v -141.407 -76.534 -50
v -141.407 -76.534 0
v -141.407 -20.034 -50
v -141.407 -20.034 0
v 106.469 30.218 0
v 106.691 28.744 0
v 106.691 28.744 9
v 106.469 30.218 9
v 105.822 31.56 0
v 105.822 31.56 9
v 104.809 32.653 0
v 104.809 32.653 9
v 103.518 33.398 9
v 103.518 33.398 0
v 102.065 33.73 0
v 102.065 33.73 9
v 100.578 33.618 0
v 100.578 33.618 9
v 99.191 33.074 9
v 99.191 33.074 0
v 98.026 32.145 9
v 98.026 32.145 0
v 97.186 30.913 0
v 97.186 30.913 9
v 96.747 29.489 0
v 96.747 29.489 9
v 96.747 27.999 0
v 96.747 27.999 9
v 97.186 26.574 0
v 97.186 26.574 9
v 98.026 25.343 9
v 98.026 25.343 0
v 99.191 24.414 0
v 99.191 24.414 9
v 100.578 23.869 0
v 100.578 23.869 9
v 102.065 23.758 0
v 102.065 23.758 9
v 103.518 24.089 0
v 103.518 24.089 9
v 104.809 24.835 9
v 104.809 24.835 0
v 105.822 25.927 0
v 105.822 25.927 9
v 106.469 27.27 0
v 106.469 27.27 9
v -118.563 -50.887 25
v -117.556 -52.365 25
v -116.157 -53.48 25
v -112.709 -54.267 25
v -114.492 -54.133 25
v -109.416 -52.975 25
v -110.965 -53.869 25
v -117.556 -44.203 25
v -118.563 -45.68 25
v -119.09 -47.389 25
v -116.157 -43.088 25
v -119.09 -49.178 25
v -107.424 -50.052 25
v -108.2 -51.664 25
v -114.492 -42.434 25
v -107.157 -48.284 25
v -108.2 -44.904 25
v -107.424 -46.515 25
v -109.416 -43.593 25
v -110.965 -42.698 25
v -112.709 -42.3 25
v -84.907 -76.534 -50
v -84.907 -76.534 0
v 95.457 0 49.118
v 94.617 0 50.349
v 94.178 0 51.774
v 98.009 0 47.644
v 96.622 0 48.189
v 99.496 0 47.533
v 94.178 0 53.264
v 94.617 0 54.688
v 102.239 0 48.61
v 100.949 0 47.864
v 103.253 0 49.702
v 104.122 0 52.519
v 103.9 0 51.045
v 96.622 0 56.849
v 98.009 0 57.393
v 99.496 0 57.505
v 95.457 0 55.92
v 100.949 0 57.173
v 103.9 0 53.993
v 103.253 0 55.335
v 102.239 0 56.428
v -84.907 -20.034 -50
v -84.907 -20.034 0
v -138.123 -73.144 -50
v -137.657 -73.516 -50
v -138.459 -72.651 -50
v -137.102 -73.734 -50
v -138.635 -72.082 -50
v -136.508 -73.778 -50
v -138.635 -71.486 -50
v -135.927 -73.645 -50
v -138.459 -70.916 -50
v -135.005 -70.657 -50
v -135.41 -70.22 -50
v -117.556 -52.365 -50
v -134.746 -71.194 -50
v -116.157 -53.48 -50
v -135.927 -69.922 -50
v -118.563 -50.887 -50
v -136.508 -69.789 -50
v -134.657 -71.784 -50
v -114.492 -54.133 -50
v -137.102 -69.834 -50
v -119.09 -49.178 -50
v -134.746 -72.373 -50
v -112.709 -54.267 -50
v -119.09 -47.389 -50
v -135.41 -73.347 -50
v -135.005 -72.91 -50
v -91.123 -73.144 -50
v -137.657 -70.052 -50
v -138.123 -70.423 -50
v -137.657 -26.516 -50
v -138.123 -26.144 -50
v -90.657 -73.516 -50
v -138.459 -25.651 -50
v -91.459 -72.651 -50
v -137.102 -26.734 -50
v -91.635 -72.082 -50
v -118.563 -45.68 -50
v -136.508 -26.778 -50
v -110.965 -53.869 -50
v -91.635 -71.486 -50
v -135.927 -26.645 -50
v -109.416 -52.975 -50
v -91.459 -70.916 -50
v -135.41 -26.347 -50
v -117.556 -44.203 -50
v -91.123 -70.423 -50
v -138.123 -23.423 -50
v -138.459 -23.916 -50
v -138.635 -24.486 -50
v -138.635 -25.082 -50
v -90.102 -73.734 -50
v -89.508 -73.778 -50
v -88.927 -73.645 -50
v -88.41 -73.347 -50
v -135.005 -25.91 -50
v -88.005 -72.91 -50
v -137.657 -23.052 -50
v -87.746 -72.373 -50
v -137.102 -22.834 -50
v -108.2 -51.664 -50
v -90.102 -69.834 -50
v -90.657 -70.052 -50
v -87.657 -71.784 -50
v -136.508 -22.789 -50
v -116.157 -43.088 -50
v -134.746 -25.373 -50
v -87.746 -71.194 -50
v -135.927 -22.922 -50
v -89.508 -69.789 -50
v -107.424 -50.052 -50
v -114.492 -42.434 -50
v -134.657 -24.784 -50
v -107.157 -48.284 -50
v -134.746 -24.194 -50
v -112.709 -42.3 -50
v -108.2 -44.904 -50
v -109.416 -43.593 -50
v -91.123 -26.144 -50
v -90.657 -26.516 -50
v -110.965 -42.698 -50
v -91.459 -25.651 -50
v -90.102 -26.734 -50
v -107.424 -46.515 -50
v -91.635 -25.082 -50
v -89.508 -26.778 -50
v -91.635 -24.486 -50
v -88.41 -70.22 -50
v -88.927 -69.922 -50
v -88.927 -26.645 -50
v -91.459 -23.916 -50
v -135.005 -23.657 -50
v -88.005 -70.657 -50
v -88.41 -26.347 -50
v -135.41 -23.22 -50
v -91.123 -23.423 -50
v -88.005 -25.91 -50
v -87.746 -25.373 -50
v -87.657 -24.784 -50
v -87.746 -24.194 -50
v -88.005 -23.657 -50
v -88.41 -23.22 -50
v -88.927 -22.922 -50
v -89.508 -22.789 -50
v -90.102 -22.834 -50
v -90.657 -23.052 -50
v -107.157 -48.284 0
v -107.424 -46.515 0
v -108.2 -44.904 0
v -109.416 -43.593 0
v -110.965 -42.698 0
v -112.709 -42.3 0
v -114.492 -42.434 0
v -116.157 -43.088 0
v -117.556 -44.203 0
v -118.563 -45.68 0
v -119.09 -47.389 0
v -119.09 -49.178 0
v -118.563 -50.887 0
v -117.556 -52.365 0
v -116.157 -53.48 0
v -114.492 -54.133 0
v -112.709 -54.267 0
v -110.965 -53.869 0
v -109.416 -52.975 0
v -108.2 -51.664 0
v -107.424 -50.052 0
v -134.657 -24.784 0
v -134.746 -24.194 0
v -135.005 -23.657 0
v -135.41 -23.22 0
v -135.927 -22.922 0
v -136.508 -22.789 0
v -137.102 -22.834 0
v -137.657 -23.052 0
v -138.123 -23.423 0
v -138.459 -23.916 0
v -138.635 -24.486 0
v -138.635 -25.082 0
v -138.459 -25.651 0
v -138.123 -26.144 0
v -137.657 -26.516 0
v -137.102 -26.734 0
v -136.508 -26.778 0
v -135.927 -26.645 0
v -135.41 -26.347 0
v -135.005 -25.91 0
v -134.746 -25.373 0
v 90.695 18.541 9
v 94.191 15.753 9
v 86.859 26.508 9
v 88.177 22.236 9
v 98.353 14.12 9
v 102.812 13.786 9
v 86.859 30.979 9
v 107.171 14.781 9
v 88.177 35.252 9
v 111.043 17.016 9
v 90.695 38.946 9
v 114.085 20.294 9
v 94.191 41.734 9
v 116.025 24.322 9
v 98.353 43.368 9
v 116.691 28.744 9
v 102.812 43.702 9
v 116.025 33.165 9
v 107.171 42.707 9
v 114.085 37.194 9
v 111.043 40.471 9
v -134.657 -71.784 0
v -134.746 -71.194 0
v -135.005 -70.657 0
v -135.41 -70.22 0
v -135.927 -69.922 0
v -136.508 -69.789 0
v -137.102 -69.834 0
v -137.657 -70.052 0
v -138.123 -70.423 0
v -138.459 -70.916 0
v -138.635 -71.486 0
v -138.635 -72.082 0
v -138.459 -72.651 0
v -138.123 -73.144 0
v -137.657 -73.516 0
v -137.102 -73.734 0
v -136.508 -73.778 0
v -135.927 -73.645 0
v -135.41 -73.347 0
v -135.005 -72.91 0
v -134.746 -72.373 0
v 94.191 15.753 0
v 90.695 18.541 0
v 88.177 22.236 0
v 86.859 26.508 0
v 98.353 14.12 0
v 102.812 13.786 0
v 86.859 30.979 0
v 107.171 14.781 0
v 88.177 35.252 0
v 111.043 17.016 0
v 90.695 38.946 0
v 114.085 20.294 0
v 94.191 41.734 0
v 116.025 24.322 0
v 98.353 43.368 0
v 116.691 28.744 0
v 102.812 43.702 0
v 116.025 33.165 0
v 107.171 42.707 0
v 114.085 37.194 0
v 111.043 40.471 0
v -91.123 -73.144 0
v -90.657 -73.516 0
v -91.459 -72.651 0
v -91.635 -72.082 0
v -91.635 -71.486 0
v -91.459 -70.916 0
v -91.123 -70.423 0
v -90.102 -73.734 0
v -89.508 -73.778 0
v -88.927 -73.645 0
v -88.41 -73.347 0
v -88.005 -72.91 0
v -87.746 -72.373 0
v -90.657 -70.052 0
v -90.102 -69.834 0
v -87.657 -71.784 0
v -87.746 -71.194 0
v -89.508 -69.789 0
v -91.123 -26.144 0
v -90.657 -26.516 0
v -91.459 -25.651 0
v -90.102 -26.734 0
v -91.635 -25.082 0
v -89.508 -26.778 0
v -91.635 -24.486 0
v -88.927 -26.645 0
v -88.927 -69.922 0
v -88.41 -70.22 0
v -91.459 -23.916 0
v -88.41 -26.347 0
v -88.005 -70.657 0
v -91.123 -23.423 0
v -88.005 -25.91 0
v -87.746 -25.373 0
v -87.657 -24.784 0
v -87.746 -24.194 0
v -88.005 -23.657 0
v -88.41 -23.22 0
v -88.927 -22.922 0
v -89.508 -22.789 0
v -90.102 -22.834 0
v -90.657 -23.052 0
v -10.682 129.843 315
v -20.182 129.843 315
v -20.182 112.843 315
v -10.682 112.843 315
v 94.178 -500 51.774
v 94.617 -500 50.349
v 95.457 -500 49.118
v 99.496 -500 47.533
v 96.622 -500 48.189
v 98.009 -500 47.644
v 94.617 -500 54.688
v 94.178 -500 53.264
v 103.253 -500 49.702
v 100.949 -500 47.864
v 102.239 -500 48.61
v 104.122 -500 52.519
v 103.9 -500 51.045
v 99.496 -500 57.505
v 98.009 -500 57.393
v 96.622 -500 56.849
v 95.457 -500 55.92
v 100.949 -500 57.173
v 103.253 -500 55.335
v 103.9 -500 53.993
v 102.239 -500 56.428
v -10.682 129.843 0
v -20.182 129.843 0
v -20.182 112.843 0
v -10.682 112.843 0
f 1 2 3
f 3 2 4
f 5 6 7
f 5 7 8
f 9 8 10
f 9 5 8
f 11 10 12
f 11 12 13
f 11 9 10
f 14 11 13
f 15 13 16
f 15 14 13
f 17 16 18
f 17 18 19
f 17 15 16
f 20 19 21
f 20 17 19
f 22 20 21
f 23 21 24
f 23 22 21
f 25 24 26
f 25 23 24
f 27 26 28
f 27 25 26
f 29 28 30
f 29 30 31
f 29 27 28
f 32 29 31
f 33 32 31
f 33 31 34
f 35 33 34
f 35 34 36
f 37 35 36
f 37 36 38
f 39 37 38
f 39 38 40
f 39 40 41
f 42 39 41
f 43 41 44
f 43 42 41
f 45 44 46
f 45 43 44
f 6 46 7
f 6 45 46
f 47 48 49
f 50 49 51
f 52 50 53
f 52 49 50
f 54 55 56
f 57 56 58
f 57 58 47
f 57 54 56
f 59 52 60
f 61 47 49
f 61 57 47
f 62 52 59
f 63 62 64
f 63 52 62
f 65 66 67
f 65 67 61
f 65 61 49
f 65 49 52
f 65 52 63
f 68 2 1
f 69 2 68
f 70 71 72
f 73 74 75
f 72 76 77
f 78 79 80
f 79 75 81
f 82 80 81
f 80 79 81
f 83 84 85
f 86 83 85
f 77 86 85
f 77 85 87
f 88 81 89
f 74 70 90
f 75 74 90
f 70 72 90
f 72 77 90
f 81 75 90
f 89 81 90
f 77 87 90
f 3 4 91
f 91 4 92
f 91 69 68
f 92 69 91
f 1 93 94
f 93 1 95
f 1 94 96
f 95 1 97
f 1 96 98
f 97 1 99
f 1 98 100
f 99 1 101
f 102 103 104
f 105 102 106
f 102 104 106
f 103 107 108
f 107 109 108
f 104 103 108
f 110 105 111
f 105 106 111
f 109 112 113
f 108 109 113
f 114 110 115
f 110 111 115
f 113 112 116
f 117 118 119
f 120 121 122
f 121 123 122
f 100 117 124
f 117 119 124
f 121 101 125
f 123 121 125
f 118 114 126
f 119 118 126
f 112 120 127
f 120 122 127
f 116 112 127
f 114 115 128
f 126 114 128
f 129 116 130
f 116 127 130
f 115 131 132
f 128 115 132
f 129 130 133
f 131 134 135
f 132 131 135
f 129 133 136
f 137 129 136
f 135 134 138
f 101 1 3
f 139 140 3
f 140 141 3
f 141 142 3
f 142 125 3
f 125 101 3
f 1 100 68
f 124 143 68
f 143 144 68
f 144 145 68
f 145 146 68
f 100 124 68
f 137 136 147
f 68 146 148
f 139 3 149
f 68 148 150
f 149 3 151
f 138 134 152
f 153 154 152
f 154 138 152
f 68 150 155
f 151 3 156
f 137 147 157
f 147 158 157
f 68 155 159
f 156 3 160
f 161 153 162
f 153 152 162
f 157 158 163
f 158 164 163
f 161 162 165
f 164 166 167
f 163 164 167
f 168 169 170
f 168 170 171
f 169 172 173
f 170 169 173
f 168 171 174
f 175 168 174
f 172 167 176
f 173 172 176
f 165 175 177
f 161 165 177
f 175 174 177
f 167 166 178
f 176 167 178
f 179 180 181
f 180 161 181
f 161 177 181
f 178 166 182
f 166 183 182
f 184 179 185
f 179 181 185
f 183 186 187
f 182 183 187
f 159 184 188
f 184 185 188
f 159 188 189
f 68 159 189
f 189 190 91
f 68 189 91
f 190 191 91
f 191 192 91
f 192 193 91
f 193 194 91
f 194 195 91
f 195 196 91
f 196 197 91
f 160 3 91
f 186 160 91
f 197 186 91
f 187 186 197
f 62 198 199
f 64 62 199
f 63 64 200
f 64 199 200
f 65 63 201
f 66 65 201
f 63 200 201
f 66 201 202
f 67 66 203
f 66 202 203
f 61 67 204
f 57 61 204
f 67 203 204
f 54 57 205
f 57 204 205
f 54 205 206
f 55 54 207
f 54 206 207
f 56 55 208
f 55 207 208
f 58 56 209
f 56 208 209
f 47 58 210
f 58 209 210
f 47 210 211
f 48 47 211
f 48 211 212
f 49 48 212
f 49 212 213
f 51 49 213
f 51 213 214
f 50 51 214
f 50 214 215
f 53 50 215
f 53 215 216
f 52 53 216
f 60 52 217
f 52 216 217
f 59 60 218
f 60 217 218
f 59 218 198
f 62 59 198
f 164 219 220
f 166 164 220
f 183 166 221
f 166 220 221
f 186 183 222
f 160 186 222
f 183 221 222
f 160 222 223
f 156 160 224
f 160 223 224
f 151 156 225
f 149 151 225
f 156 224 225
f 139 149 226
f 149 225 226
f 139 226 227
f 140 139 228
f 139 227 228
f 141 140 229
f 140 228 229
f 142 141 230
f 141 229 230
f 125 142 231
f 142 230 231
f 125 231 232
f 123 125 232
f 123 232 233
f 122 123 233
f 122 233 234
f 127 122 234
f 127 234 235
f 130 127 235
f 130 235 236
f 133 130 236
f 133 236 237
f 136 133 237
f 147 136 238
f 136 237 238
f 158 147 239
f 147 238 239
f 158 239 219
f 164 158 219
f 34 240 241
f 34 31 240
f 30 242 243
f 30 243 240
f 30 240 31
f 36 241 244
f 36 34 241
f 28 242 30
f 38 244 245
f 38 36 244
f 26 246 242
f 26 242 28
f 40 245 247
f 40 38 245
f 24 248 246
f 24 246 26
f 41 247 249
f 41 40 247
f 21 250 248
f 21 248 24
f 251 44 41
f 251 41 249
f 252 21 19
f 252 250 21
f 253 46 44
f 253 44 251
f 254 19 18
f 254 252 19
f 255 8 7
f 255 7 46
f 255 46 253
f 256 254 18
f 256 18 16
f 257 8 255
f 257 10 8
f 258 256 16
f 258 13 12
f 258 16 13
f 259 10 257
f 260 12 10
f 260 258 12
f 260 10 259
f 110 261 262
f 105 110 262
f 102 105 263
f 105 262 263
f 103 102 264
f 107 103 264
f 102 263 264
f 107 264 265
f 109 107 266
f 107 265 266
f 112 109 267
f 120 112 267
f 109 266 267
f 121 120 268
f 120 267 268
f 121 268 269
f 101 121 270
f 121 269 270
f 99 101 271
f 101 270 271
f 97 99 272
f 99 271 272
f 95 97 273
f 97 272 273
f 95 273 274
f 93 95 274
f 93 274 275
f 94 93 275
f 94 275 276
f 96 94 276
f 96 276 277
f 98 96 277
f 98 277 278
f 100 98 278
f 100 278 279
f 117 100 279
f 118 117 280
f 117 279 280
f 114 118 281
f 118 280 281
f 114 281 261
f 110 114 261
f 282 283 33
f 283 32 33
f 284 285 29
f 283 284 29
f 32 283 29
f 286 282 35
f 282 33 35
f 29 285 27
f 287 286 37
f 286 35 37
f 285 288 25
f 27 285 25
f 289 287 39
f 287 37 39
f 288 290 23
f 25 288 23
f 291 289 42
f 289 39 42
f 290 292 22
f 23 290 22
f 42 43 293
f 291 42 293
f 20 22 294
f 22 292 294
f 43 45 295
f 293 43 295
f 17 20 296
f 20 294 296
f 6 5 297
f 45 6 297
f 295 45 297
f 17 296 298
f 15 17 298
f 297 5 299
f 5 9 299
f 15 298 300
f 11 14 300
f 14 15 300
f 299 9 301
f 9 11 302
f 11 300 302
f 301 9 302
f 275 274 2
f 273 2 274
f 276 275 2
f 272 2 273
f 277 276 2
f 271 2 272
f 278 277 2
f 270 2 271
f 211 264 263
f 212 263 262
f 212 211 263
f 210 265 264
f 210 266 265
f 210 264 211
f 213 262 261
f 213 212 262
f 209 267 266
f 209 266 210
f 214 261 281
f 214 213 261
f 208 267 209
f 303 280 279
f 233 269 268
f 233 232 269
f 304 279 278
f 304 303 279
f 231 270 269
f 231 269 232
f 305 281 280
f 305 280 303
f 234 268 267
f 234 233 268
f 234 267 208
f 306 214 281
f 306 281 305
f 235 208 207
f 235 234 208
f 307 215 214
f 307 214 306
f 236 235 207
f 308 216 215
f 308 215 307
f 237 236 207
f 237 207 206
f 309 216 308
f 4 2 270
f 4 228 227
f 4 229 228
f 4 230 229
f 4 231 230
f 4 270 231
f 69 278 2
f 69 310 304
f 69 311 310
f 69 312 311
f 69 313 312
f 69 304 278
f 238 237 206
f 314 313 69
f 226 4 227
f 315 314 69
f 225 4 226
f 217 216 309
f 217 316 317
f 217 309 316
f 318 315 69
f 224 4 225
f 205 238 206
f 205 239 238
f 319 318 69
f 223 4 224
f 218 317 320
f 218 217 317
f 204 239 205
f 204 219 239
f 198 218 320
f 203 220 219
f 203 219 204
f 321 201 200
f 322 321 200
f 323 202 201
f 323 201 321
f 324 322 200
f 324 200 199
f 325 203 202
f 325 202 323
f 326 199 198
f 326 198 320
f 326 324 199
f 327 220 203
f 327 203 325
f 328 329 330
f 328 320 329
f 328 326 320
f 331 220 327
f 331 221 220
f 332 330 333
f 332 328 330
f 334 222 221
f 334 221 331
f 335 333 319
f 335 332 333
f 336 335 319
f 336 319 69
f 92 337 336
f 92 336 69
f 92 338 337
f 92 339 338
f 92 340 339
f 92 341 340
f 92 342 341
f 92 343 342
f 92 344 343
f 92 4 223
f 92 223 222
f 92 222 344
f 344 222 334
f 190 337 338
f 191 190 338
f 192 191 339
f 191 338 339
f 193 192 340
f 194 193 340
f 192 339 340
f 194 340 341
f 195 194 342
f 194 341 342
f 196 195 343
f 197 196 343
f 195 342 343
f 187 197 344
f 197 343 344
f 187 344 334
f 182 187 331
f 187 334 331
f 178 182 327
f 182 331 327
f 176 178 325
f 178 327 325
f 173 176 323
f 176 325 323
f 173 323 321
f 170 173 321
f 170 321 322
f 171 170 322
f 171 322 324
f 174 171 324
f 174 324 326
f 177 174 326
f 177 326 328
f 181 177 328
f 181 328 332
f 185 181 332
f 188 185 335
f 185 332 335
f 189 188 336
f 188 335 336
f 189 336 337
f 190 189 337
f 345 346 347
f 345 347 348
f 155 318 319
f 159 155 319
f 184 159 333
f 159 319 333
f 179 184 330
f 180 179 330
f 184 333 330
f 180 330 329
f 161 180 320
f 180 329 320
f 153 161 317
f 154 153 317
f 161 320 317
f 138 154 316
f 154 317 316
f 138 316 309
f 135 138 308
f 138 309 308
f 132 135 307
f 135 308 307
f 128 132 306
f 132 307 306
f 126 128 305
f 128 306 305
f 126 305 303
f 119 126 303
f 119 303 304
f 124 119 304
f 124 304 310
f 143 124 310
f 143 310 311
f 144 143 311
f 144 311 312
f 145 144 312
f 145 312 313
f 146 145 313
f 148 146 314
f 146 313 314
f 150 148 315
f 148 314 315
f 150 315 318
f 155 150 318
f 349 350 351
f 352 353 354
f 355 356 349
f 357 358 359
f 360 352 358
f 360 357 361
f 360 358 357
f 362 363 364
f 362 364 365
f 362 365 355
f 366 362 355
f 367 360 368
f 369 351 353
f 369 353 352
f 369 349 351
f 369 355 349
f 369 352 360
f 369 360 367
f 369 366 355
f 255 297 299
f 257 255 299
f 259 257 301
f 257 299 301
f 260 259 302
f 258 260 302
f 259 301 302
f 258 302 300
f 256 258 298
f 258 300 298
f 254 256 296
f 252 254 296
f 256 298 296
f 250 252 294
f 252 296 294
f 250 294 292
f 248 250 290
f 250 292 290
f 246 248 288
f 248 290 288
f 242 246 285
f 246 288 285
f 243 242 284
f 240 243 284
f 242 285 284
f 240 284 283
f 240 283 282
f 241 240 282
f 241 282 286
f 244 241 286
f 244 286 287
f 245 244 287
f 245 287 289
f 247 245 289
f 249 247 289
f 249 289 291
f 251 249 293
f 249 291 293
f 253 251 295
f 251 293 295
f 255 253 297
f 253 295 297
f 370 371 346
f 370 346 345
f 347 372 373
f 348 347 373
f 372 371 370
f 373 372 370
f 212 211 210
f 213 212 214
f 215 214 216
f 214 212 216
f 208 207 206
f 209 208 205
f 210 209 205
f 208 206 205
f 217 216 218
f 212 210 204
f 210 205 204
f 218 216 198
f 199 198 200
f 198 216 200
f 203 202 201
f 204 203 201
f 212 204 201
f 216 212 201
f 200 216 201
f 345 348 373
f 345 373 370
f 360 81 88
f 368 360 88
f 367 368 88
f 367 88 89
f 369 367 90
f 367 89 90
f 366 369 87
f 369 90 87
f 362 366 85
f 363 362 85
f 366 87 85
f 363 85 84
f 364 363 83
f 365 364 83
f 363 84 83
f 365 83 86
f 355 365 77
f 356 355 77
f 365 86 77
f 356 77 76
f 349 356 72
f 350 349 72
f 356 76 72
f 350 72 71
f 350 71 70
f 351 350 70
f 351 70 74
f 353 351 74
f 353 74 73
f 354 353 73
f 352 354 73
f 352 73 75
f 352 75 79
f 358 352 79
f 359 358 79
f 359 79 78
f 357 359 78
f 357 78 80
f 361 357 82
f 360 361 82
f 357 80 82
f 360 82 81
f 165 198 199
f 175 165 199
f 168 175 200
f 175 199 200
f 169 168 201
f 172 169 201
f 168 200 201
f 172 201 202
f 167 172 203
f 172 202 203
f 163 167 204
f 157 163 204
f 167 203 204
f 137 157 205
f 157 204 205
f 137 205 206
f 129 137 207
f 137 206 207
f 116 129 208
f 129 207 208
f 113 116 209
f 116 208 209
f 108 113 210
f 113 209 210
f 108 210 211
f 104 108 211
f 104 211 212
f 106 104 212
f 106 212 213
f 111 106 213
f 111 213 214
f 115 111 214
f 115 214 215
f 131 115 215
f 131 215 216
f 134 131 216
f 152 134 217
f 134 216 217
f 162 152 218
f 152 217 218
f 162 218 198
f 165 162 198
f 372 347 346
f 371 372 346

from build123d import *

# Parameters (mm, degrees)
F0_R     = 6
F1_DEPTH = 25
F0_W     = 56.5
F0_H     = 56.5
F0_R_2   = 2
F2_DEPTH = 50
F3_R     = 15
F3_R_2   = 5
F4_DEPTH = 9
F5_R     = 5
F6_DEPTH = 500
F7_W     = 9.5
F7_H     = 17
F8_DEPTH = 315


with BuildPart() as f1:
    # F0 (on Top) → F1 (new body)
    with BuildSketch(Plane.XY):
        with Locations((-113.157216, -48.283662)):
            Circle(F0_R)
    extrude(amount=F1_DEPTH)


with BuildPart() as f2:
    # F0 (on Top) → F2 (new body)
    with BuildSketch(Plane.XY):
        with Locations((-113.157216, -48.283662)):
            Rectangle(F0_W, F0_H)
        with Locations((-136.657216, -71.783662)):
            Circle(F0_R_2, mode=Mode.SUBTRACT)
        with Locations((-89.657216, -71.783662)):
            Circle(F0_R_2, mode=Mode.SUBTRACT)
        with Locations((-113.157216, -48.283662)):
            Circle(F0_R, mode=Mode.SUBTRACT)
        with Locations((-136.657216, -24.783662)):
            Circle(F0_R_2, mode=Mode.SUBTRACT)
        with Locations((-89.657216, -24.783662)):
            Circle(F0_R_2, mode=Mode.SUBTRACT)
    extrude(amount=-F2_DEPTH)


with BuildPart() as f4:
    # F3 (on Top) → F4 (new body)
    with BuildSketch(Plane.XY):
        with Locations((101.691082, 28.743761)):
            Circle(F3_R)
        with Locations((101.691082, 28.743761)):
            Circle(F3_R_2, mode=Mode.SUBTRACT)
    extrude(amount=F4_DEPTH)


with BuildPart() as f6:
    # F5 (on Front) → F6 (new body)
    with BuildSketch(Plane.XZ):
        with Locations((99.121988, 52.518774)):
            Circle(F5_R)
    extrude(amount=F6_DEPTH)


with BuildPart() as f8:
    # F7 (on Top) → F8 (new body)
    with BuildSketch(Plane.XY):
        with Locations((-15.431996, 121.342674)):
            Rectangle(F7_W, F7_H)
    extrude(amount=F8_DEPTH)


solid = Compound([f1.part, f2.part, f4.part, f6.part, f8.part])
